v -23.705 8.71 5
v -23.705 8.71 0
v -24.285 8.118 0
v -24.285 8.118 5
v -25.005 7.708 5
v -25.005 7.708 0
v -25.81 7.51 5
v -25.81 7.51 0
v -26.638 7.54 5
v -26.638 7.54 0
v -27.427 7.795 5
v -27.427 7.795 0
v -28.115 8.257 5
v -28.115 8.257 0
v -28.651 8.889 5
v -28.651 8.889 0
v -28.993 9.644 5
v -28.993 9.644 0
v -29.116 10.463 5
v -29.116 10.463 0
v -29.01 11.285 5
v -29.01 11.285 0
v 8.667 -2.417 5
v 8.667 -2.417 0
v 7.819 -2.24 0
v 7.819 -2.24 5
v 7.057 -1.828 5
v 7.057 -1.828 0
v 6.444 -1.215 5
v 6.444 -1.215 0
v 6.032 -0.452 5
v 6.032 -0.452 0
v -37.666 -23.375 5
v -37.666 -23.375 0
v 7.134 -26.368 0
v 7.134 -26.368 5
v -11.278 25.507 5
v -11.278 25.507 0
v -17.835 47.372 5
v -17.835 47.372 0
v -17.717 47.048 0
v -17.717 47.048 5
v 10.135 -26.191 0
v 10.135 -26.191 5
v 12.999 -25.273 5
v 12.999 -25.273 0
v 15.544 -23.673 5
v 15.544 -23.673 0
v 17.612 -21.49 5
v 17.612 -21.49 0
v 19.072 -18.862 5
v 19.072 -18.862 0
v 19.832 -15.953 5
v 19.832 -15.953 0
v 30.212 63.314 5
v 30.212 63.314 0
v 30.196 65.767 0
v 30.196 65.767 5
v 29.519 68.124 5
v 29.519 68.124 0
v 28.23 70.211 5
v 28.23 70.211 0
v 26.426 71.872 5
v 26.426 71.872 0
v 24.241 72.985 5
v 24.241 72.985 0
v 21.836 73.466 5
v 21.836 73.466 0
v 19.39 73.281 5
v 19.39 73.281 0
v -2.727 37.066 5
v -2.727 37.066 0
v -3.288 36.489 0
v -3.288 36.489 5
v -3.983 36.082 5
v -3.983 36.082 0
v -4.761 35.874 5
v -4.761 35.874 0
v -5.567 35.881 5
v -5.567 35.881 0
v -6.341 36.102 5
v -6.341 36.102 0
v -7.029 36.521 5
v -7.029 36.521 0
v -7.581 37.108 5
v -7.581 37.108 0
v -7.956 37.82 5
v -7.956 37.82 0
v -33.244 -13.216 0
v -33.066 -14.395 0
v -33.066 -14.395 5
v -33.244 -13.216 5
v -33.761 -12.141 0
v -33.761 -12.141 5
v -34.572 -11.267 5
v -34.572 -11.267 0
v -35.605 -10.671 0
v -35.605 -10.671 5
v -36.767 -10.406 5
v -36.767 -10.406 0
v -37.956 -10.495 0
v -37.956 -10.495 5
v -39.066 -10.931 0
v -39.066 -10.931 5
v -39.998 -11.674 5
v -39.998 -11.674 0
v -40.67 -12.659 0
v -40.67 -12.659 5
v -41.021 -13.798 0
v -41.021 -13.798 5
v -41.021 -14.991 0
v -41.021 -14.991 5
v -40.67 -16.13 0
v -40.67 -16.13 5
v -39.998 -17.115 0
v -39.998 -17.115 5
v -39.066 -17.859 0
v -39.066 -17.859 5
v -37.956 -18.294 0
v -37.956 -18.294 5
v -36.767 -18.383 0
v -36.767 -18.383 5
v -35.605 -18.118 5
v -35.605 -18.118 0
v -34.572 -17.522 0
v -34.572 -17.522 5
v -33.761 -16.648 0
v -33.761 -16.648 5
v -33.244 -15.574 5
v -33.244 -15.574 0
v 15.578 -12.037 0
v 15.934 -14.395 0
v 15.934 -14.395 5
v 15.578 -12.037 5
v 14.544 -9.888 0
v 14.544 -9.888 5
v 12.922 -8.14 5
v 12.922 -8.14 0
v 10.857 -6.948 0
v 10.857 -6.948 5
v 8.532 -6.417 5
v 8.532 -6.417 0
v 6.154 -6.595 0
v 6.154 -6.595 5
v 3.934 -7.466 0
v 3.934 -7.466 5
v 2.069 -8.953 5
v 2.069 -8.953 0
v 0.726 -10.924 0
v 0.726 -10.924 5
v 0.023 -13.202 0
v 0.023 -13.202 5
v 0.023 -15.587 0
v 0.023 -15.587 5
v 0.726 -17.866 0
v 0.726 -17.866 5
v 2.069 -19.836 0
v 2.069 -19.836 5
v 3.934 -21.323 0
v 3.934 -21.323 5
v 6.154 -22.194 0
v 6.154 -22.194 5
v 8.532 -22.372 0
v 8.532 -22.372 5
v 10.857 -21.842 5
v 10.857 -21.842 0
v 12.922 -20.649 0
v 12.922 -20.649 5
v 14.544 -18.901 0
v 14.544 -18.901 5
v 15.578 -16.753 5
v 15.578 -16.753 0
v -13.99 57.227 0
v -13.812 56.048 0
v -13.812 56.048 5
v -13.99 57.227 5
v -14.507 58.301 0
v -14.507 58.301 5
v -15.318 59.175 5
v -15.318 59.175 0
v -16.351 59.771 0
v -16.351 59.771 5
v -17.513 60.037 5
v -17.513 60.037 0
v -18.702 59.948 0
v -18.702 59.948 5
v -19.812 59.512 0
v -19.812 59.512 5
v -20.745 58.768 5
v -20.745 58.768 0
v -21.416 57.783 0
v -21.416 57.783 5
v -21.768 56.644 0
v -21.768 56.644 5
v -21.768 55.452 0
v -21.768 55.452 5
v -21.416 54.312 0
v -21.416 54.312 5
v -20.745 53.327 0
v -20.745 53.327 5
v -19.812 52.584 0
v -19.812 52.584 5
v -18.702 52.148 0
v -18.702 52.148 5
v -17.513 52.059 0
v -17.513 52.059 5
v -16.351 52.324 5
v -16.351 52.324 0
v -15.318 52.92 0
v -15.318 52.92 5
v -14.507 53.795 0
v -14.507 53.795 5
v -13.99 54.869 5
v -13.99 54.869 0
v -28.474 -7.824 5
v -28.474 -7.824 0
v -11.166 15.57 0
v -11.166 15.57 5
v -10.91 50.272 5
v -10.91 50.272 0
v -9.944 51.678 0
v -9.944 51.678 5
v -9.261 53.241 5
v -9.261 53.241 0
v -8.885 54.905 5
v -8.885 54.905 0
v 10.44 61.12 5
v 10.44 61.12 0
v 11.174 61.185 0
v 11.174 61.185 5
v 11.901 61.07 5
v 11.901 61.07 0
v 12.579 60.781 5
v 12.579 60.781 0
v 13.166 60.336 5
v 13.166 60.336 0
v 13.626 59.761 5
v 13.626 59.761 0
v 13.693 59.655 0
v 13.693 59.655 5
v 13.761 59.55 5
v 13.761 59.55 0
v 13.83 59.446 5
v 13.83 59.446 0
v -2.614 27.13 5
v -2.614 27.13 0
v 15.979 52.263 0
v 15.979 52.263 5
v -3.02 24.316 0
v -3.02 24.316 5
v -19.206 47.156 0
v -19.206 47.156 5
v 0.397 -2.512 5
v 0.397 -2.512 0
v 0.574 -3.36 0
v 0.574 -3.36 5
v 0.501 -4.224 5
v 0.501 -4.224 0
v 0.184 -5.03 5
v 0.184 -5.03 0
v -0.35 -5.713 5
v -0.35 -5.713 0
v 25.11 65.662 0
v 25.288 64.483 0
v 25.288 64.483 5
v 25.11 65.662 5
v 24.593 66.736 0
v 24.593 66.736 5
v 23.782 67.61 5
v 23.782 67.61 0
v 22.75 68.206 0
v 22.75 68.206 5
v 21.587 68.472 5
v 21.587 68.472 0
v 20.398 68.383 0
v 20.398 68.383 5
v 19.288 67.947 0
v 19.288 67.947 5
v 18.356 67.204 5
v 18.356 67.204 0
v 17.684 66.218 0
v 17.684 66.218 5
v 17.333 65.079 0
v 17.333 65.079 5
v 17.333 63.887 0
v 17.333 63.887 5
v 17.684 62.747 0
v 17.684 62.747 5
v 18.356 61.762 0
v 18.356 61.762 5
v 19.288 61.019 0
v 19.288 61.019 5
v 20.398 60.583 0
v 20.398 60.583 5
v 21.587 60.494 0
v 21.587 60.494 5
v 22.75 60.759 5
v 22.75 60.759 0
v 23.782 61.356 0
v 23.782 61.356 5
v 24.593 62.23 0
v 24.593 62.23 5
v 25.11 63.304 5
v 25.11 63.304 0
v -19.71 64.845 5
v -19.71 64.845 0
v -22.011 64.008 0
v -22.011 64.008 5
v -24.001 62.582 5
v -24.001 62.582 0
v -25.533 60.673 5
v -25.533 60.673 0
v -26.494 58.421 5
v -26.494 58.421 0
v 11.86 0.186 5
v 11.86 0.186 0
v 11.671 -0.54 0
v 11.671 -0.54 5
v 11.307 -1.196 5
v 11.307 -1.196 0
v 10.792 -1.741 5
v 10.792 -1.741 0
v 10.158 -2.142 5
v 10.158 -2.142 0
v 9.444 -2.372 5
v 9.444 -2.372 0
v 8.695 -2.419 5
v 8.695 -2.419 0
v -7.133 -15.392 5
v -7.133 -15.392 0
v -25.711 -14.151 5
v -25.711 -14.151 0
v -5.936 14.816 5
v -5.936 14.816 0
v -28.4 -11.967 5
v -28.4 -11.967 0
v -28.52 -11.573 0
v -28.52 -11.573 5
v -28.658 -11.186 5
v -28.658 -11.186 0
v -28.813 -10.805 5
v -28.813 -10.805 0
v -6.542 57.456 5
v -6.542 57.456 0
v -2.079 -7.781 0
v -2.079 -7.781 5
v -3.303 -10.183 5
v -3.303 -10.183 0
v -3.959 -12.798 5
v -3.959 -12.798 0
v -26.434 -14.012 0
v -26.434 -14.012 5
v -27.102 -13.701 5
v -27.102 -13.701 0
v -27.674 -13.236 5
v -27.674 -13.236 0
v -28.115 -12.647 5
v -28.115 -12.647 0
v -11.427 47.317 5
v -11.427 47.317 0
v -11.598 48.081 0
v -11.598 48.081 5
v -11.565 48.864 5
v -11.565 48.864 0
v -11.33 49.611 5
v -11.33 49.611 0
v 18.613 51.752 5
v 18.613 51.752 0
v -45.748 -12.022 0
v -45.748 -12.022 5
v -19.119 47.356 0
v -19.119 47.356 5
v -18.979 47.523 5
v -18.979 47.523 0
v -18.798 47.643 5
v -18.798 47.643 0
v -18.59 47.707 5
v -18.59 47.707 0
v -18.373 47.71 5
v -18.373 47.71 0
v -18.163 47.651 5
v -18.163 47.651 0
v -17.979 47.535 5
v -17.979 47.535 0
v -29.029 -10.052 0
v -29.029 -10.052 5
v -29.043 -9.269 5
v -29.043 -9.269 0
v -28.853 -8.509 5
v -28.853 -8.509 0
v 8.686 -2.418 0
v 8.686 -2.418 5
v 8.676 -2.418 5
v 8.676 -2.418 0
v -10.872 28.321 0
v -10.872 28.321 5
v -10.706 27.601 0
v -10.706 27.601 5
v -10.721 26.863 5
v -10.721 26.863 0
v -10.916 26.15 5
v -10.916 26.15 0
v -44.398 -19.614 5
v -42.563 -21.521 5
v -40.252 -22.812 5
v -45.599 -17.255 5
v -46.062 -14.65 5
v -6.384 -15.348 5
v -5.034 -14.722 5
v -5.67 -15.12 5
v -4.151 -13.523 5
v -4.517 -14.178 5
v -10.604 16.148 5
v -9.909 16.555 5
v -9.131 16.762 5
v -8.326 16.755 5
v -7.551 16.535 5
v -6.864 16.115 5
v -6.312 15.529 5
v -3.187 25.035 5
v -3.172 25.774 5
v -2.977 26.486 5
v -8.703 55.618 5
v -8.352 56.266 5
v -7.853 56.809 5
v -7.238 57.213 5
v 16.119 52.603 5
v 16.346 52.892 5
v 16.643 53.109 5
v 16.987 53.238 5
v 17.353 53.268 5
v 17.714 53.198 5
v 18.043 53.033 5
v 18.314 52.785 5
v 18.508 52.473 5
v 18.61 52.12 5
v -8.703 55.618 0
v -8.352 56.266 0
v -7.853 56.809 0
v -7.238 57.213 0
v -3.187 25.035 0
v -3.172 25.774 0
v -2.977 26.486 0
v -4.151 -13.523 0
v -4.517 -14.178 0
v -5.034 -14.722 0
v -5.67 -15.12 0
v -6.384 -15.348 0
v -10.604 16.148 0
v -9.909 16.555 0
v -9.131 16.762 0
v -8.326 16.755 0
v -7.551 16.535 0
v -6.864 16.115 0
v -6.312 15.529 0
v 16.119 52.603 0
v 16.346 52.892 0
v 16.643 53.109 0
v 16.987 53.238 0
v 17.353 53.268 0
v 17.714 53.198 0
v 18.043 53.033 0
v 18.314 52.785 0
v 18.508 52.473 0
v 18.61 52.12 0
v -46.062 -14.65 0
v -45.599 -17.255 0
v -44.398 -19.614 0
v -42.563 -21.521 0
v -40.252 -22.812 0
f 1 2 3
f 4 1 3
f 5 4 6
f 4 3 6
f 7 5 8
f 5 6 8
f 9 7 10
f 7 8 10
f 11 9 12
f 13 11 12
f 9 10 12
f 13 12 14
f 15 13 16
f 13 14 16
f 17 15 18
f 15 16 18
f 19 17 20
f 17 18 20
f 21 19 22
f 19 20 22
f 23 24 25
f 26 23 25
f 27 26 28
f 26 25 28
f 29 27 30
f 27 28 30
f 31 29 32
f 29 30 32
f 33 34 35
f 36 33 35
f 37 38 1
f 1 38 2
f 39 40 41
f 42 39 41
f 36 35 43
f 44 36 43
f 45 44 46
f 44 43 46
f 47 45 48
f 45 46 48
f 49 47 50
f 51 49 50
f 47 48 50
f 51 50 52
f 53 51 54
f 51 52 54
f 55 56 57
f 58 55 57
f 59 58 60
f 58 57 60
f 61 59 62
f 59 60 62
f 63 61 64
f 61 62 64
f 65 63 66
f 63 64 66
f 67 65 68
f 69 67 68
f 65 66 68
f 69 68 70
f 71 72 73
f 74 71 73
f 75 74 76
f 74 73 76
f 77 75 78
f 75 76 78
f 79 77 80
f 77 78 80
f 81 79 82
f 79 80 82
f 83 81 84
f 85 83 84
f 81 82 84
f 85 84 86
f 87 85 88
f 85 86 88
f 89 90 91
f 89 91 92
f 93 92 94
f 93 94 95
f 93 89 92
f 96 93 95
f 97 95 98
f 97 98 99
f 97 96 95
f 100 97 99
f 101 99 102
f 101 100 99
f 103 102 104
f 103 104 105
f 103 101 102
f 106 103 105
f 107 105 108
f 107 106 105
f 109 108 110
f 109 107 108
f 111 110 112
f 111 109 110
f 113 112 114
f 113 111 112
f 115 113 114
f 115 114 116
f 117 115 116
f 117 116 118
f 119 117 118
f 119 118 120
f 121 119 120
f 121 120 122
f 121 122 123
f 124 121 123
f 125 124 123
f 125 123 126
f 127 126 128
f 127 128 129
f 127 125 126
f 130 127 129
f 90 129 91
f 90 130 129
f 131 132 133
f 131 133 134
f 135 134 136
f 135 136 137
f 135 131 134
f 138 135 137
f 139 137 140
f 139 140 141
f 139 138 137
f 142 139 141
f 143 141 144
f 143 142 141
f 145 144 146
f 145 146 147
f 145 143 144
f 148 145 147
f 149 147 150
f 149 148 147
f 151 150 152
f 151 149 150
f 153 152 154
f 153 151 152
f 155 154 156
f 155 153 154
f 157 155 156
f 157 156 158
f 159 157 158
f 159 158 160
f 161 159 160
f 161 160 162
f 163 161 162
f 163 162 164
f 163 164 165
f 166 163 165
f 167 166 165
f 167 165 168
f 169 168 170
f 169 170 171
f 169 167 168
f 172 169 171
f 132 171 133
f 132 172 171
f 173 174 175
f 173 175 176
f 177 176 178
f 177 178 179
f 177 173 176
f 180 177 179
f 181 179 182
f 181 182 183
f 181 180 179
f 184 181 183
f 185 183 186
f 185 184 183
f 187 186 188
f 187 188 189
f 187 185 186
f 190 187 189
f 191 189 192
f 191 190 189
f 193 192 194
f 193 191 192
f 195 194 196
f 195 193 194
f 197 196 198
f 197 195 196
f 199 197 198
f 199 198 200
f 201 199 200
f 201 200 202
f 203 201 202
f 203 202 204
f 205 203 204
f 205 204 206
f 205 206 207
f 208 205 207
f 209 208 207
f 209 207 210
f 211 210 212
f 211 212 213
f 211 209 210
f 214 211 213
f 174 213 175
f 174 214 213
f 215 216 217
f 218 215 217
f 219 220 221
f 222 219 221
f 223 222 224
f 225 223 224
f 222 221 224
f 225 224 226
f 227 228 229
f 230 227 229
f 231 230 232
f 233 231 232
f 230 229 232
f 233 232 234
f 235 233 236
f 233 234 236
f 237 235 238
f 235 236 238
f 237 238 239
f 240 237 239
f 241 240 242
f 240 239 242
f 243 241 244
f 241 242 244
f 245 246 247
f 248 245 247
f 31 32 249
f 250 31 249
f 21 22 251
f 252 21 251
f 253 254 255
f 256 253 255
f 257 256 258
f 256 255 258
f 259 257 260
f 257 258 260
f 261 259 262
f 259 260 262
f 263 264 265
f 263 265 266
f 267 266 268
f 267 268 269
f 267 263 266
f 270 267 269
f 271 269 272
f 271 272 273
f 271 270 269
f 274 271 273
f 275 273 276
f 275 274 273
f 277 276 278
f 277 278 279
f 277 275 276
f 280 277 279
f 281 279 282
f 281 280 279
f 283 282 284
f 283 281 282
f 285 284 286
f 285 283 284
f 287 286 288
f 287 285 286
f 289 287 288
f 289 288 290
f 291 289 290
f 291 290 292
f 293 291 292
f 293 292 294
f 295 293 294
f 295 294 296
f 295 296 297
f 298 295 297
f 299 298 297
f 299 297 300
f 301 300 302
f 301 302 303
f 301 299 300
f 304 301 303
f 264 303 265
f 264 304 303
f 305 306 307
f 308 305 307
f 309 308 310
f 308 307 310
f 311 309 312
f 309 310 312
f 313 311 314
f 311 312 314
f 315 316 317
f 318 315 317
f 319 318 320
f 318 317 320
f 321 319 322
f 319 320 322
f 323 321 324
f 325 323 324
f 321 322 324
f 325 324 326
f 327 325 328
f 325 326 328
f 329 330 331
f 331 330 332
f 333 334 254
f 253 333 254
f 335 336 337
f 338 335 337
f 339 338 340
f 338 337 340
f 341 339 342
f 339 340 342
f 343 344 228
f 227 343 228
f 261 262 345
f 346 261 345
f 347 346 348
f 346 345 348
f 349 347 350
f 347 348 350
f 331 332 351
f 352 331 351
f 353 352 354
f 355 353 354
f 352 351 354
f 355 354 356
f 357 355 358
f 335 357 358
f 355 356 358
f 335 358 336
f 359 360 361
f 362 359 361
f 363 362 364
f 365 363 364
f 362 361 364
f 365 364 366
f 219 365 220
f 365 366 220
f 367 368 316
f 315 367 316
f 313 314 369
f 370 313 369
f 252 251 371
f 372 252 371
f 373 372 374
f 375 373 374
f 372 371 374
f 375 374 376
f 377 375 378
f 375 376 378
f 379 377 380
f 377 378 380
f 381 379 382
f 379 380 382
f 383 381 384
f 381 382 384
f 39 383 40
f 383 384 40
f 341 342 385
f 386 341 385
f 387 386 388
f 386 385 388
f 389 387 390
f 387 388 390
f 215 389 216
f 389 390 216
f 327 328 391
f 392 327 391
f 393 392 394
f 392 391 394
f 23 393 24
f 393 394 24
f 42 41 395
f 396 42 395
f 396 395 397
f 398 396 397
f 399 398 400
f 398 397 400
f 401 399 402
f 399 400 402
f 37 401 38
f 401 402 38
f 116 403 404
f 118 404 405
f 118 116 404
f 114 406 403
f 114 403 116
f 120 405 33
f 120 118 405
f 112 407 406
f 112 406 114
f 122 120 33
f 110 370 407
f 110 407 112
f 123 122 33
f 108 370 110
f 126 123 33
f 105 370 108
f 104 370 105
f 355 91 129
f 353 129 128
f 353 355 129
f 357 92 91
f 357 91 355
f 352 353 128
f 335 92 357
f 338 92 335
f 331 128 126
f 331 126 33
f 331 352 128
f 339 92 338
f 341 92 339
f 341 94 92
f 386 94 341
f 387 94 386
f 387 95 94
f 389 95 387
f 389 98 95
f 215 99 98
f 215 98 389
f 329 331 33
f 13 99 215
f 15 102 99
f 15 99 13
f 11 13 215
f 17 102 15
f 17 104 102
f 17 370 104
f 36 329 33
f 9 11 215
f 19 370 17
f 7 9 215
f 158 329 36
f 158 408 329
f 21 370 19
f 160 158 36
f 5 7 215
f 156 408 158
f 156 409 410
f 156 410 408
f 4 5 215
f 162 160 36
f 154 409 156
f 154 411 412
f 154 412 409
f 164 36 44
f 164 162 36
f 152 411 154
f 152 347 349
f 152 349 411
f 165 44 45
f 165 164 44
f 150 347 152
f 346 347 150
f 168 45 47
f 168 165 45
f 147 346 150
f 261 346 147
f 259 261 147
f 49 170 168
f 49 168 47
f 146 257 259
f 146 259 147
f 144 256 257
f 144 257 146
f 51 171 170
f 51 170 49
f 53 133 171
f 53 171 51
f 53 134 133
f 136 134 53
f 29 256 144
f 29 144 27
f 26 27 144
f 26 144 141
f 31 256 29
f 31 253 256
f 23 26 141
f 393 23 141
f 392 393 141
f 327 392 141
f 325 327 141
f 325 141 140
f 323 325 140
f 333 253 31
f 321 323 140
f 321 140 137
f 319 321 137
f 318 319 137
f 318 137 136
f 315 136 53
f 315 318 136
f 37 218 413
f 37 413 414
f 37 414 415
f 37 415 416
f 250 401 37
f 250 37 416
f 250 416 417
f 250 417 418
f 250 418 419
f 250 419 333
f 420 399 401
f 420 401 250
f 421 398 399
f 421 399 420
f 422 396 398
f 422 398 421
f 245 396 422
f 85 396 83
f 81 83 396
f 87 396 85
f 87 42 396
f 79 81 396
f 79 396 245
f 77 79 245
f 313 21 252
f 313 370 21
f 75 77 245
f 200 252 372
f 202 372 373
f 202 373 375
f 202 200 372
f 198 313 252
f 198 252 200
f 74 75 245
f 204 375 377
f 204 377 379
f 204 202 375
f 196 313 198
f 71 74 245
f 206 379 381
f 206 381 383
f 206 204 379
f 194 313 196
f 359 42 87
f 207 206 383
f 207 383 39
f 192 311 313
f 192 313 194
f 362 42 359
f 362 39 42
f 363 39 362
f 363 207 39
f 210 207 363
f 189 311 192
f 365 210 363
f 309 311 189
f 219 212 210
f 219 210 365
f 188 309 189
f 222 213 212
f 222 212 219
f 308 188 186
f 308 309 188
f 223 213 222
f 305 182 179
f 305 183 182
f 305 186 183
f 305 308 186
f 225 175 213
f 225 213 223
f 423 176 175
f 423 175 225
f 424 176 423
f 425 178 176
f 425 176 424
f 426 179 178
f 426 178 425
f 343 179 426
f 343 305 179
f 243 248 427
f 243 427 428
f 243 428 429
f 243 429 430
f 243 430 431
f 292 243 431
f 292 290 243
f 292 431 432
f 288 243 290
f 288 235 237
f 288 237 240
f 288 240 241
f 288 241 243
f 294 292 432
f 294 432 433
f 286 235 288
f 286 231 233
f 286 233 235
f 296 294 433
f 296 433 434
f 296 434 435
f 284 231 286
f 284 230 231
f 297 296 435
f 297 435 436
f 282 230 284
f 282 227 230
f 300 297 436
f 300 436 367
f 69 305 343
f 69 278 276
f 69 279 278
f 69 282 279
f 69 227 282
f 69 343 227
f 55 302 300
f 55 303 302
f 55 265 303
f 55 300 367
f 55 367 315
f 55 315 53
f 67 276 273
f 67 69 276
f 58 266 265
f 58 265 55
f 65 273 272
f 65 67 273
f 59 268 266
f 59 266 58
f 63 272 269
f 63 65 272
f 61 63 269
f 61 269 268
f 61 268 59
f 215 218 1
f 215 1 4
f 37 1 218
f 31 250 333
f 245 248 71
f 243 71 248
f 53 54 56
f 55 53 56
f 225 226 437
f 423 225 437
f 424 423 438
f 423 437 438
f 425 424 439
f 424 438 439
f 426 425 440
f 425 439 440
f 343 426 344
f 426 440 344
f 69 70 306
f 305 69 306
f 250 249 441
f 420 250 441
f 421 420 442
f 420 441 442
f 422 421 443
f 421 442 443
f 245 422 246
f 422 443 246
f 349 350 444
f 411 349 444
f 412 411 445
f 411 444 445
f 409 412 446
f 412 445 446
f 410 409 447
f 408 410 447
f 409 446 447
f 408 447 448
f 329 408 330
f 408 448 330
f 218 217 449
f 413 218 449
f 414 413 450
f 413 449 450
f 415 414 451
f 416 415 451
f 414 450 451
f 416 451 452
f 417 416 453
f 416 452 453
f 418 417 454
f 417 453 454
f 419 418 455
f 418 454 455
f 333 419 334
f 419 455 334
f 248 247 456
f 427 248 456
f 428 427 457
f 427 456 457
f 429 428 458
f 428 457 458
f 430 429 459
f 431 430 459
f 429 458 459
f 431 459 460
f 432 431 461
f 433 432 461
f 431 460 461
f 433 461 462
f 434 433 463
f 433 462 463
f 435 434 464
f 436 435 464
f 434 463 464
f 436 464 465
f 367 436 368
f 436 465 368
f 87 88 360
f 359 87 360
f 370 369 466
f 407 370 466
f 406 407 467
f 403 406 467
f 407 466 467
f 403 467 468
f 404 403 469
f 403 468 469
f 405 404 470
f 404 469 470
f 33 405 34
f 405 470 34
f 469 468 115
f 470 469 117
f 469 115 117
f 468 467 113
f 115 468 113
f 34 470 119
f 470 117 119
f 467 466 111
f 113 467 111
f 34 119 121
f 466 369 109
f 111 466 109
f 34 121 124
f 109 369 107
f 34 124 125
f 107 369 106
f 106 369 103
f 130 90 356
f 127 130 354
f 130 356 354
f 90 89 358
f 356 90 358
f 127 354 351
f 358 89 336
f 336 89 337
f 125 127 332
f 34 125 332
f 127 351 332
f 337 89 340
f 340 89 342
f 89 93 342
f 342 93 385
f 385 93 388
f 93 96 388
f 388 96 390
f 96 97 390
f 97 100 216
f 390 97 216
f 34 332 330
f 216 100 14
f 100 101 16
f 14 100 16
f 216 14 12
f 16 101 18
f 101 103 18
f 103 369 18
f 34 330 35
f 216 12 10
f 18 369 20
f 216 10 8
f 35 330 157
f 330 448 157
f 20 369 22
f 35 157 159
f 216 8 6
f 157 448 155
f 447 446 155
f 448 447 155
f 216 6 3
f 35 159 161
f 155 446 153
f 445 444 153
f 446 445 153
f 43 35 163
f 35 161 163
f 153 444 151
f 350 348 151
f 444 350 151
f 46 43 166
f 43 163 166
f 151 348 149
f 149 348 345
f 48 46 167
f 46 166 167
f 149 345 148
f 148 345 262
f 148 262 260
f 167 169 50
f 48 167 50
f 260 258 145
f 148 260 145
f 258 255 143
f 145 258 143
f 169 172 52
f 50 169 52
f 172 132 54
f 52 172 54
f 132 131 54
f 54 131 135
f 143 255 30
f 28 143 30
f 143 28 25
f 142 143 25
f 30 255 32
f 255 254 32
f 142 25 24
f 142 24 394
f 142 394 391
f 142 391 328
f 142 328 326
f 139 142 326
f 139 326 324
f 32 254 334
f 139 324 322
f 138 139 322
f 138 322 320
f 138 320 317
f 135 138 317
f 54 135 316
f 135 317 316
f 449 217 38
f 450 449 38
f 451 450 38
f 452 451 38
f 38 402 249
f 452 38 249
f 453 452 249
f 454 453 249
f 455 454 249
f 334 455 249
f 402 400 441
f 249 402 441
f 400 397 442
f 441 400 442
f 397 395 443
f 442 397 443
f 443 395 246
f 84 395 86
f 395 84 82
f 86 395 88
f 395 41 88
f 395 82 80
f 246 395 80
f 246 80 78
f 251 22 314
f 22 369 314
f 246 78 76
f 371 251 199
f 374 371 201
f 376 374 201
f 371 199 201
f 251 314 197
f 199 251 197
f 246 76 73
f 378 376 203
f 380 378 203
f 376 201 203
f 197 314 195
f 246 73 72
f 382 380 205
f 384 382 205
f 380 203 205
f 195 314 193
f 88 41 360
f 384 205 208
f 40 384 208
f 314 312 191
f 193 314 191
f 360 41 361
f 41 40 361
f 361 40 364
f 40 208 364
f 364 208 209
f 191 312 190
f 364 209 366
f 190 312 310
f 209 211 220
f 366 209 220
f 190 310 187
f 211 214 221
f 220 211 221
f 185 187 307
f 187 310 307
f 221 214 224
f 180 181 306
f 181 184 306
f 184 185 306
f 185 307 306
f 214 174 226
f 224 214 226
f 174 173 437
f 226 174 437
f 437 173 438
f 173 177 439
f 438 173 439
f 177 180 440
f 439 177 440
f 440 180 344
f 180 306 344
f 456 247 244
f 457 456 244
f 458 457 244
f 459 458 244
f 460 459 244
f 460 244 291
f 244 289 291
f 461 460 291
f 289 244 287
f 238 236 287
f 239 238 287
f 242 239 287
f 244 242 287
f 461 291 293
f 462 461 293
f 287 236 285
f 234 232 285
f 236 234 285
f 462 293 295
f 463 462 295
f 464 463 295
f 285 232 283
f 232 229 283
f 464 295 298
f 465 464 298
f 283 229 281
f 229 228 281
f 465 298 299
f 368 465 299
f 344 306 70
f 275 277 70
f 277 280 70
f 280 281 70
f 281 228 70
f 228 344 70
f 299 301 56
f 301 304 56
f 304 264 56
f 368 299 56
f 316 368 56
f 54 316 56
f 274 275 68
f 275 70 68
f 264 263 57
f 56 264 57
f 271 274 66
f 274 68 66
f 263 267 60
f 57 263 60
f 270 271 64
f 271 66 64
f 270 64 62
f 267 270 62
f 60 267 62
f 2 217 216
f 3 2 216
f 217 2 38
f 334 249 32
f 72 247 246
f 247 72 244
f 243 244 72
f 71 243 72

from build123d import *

# Parameters (mm, degrees)
F0_R     = 4
F0_R_2   = 8
F1_DEPTH = 5


with BuildPart() as f1:
    # F0 (on Top) → F1 (new body)
    with BuildSketch(Plane.XY):
        with BuildLine():
            Line((19.390299, 73.280526), (-19.7102, 64.84542))
            ThreePointArc((-19.7102, 64.84542), (-24.001035, 62.582299), (-26.493853, 58.420709))
            Line((-26.493853, 58.420709), (-45.747654, -12.021702))
            ThreePointArc((-45.747654, -12.021702), (-44.398139, -19.613916), (-37.666102, -23.37458))
            Line((-37.666102, -23.37458), (7.133898, -26.367906))
            ThreePointArc((7.133898, -26.367906), (15.543966, -23.672904), (19.832321, -15.952653))
            Line((19.832321, -15.952653), (30.212015, 63.314377))
            ThreePointArc((30.212015, 63.314377), (27.385075, 71.103192), (19.390299, 73.280526))
        make_face()
        with Locations((-37.066102, -14.394603)):
            Circle(F0_R, mode=Mode.SUBTRACT)
        with BuildLine():
            ThreePointArc((-25.710896, -14.151075), (-27.402393, -13.486319), (-28.399698, -11.966962))
            ThreePointArc((-28.399698, -11.966962), (-28.586382, -11.37892), (-28.812914, -10.80505))
            ThreePointArc((-28.812914, -10.80505), (-29.0426, -9.269216), (-28.473597, -7.824301))
            Line((-28.473597, -7.824301), (-11.165939, 15.570463))
            ThreePointArc((-11.165939, 15.570463), (-8.325856, 16.755496), (-5.936497, 14.81608))
            Line((-5.936497, 14.81608), (0.396845, -2.512144))
            ThreePointArc((0.396845, -2.512144), (0.500674, -4.223675), (-0.349901, -5.712514))
            ThreePointArc((-0.349901, -5.712514), (-2.758659, -8.947656), (-3.959435, -12.798162))
            ThreePointArc((-3.959435, -12.798162), (-5.033997, -14.721694), (-7.132769, -15.392378))
            Line((-7.132769, -15.392378), (-25.710896, -14.151075))
        make_face(mode=Mode.SUBTRACT)
        with Locations((7.933898, -14.394603)):
            Circle(F0_R_2, mode=Mode.SUBTRACT)
        with BuildLine():
            ThreePointArc((-23.704846, 8.709998), (-27.426561, 7.795344), (-29.010443, 11.285196))
            Line((-29.010443, 11.285196), (-19.205892, 47.156357))
            ThreePointArc((-19.205892, 47.156357), (-18.590371, 47.707216), (-17.835441, 47.371966))
            Line((-17.835441, 47.371966), (-17.717148, 47.048311))
            Line((-17.717148, 47.048311), (-10.872426, 28.320938))
            ThreePointArc((-10.872426, 28.320938), (-10.720859, 26.862753), (-11.278377, 25.506859))
            Line((-11.278377, 25.506859), (-23.704846, 8.709998))
        make_face(mode=Mode.SUBTRACT)
        with Locations((-17.812301, 56.047808)):
            Circle(F0_R, mode=Mode.SUBTRACT)
        with BuildLine():
            ThreePointArc((11.860198, 0.185664), (10.79185, -1.741326), (8.695253, -2.41878))
            ThreePointArc((8.695253, -2.41878), (8.680991, -2.417881), (8.666727, -2.417))
            ThreePointArc((8.666727, -2.417), (7.056552, -1.827548), (6.032238, -0.452448))
            Line((6.032238, -0.452448), (-3.020297, 24.315573))
            ThreePointArc((-3.020297, 24.315573), (-3.171864, 25.773758), (-2.614346, 27.129653))
            Line((-2.614346, 27.129653), (15.979434, 52.262869))
            ThreePointArc((15.979434, 52.262869), (17.536186, 53.24565), (18.612615, 51.752118))
            Line((18.612615, 51.752118), (11.860198, 0.185664))
        make_face(mode=Mode.SUBTRACT)
        with BuildLine():
            Line((-6.542132, 57.456104), (10.439784, 61.119593))
            ThreePointArc((10.439784, 61.119593), (12.248976, 60.946714), (13.626362, 59.761021))
            ThreePointArc((13.626362, 59.761021), (13.726479, 59.602298), (13.829883, 59.445698))
            Line((13.829883, 59.445698), (-2.726784, 37.066048))
            ThreePointArc((-2.726784, 37.066048), (-5.566867, 35.881016), (-7.956226, 37.820432))
            Line((-7.956226, 37.820432), (-11.427107, 47.316869))
            ThreePointArc((-11.427107, 47.316869), (-11.564531, 48.863691), (-10.910133, 50.27199))
            ThreePointArc((-10.910133, 50.27199), (-9.565679, 52.443196), (-8.8852, 54.904627))
            ThreePointArc((-8.8852, 54.904627), (-8.119143, 56.552722), (-6.542132, 57.456104))
        make_face(mode=Mode.SUBTRACT)
        with Locations((21.288197, 64.482914)):
            Circle(F0_R, mode=Mode.SUBTRACT)
    extrude(amount=F1_DEPTH)


solid = f1.part
